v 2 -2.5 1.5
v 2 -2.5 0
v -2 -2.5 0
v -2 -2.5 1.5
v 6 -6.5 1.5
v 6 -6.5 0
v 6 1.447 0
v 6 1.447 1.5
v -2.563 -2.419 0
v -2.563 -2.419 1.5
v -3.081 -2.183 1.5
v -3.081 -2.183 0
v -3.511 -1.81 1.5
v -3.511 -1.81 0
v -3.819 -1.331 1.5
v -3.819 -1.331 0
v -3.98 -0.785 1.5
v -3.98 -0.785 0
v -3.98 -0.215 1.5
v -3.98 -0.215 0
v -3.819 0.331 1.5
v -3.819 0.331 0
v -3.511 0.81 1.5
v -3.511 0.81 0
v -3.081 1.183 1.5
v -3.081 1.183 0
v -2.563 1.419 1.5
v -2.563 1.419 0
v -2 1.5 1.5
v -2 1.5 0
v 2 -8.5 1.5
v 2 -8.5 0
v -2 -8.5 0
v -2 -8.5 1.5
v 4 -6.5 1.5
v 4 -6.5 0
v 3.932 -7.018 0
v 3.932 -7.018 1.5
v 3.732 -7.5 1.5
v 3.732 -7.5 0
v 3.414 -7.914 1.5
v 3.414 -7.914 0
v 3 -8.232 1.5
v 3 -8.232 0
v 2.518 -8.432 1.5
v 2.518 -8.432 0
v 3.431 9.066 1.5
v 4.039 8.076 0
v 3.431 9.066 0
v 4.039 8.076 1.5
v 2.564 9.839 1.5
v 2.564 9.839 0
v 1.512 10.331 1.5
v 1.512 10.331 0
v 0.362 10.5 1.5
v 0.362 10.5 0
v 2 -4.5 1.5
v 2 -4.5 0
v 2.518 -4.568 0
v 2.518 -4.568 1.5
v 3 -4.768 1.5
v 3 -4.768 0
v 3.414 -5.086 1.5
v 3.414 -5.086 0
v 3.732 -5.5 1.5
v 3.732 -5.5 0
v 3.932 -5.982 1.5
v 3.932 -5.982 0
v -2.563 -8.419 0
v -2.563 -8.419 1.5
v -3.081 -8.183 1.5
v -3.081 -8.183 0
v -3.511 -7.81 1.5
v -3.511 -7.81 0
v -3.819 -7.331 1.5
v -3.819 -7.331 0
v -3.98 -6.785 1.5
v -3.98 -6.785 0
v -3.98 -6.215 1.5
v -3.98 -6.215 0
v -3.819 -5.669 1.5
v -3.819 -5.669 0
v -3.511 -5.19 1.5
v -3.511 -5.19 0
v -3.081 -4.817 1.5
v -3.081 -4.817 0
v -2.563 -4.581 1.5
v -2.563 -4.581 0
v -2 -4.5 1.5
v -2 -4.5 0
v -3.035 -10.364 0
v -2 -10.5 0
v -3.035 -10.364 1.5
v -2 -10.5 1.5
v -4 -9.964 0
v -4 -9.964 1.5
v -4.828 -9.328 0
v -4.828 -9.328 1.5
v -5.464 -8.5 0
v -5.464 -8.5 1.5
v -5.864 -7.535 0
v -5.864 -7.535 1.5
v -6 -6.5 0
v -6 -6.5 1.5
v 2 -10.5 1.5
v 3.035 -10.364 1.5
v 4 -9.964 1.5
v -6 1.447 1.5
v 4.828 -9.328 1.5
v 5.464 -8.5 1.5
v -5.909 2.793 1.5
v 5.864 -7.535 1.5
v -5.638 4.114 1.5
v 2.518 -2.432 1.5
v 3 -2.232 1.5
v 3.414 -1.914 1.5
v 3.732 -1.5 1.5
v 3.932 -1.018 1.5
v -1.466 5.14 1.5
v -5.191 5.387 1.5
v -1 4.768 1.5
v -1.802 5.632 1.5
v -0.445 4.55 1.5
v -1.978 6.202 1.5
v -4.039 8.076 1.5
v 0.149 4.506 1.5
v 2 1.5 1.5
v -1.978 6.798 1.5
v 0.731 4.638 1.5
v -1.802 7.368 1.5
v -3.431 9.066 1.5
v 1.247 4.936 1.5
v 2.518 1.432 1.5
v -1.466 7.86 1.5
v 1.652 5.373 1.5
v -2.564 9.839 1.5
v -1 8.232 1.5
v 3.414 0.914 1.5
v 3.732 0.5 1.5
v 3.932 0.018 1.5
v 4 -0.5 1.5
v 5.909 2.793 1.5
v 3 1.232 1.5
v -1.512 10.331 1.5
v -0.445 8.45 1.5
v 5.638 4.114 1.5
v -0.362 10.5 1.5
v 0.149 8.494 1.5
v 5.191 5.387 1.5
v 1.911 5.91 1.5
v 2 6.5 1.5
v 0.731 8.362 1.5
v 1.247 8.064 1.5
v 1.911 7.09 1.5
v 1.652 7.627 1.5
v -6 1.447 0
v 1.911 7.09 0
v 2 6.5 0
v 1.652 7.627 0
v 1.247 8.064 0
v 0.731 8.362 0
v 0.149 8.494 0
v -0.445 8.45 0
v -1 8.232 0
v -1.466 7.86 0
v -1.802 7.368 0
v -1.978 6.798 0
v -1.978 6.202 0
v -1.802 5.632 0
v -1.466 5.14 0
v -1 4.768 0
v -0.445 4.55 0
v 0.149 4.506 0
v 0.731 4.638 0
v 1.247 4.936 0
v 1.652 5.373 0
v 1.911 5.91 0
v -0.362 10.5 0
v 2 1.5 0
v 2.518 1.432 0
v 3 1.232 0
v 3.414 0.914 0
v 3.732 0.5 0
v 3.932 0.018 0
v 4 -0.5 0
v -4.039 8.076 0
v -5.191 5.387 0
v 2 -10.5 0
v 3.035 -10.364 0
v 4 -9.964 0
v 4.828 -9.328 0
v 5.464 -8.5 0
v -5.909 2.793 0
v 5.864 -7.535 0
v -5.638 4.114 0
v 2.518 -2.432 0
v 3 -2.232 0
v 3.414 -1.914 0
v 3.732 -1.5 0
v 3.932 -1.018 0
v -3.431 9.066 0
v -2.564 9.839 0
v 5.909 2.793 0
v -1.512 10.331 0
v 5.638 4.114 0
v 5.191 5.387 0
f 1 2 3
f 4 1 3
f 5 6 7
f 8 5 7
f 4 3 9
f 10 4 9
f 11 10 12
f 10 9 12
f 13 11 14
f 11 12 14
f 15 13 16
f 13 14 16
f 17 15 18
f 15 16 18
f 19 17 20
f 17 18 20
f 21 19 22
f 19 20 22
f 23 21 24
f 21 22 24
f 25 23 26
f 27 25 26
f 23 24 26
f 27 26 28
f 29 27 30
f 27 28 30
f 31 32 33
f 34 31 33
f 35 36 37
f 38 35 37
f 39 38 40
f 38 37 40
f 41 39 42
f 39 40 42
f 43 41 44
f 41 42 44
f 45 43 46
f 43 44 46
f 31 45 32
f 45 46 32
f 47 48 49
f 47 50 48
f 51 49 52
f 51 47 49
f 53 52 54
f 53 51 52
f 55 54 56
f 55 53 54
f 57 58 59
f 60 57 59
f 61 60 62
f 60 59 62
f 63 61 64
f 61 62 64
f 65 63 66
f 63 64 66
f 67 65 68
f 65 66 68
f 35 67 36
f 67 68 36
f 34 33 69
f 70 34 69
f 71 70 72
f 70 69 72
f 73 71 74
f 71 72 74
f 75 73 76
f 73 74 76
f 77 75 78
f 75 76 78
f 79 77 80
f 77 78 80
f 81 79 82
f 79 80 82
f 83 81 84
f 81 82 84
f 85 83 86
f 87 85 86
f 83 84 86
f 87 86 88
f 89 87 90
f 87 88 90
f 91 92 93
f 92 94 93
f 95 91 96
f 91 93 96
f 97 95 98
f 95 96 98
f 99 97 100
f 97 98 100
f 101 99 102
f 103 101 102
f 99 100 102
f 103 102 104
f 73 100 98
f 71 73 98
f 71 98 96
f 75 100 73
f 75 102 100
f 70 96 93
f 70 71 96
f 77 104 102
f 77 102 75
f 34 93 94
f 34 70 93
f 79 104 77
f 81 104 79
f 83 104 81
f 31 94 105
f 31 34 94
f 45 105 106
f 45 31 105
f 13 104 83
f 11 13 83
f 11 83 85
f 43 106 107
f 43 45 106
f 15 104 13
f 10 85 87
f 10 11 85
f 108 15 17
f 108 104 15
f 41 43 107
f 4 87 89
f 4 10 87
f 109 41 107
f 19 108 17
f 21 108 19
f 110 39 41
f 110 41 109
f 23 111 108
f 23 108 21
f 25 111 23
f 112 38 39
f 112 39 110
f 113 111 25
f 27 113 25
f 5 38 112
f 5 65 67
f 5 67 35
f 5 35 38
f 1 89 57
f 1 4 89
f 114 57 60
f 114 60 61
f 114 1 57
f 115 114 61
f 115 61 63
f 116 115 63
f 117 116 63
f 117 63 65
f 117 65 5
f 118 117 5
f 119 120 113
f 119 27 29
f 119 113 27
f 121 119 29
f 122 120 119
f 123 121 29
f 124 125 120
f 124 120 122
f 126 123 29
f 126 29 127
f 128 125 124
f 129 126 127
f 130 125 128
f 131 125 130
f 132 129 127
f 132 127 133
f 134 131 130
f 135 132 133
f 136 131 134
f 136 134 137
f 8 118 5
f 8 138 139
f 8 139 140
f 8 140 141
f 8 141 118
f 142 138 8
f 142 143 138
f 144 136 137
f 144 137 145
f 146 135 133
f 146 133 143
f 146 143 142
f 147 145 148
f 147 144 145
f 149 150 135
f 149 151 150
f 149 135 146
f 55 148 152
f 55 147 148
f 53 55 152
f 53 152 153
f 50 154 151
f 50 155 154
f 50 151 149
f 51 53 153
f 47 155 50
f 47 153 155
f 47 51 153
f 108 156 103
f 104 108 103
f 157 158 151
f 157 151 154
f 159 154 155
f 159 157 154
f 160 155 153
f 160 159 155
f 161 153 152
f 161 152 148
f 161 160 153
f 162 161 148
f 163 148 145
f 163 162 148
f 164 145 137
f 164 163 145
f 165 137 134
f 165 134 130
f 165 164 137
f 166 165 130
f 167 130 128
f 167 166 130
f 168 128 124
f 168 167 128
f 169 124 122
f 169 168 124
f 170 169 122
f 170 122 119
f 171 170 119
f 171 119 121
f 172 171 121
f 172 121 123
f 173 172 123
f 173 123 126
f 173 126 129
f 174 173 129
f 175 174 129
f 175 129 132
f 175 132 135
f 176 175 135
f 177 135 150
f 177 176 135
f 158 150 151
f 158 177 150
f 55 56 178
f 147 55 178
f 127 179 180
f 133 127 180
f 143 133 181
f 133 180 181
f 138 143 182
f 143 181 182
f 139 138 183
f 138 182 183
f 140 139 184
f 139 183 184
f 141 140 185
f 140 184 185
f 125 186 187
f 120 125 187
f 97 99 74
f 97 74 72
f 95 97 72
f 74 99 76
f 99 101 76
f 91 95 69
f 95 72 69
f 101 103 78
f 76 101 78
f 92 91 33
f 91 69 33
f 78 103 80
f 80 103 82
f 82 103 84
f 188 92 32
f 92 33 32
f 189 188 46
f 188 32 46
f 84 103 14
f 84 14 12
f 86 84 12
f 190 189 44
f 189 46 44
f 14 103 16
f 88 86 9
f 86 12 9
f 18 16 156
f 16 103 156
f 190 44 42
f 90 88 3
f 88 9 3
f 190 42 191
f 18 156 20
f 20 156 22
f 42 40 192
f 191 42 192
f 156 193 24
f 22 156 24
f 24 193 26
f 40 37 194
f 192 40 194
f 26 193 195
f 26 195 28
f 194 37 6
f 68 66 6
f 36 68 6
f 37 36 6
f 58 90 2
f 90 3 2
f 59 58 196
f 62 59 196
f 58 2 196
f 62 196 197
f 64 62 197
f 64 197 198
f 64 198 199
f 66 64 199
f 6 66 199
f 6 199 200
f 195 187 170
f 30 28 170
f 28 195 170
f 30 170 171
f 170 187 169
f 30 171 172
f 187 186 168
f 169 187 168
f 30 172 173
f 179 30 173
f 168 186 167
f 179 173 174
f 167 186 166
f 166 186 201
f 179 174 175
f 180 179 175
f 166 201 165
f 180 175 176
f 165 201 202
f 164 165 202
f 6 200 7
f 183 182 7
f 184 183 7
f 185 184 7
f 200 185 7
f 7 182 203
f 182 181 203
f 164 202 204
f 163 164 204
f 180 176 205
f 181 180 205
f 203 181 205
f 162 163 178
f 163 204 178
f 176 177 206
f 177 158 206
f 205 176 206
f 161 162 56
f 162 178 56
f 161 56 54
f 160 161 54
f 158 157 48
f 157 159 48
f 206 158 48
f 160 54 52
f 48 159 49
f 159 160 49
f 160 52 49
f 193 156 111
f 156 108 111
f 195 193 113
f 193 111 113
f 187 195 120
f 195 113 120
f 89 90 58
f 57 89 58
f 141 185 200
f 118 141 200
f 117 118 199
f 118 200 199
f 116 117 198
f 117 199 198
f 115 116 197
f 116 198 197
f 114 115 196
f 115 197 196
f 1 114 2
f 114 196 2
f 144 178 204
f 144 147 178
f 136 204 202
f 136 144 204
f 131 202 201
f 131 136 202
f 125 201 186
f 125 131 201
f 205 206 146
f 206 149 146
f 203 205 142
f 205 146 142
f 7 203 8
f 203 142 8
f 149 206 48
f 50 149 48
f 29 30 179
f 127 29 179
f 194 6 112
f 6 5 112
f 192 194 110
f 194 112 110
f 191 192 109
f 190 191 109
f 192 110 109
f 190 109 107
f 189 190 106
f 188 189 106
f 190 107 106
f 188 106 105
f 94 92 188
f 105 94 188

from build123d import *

# Parameters (mm, degrees)
F0_R     = 2
F1_DEPTH = 1.5
F2_R     = 4
F3_R     = 10
F4_R     = 4


with BuildPart() as f1:
    # F0 (on Top) → F1 (new body)
    with BuildSketch(Plane.XY):
        Polygon((6, 3.5), (3, 10.5), (-3, 10.5), (-6, 3.5), (-6, -10.5), (6, -10.5), align=None)
        with BuildLine():
            ThreePointArc((-2, -8.5), (-4, -6.5), (-2, -4.5))
            Line((-2, -4.5), (2, -4.5))
            ThreePointArc((2, -4.5), (3.414214, -5.085786), (4, -6.5))
            ThreePointArc((4, -6.5), (3.414214, -7.914214), (2, -8.5))
            Line((2, -8.5), (-2, -8.5))
        make_face(mode=Mode.SUBTRACT)
        with BuildLine():
            ThreePointArc((-2, -2.5), (-4, -0.5), (-2, 1.5))
            Line((-2, 1.5), (2, 1.5))
            ThreePointArc((2, 1.5), (3.414214, 0.914214), (4, -0.5))
            ThreePointArc((4, -0.5), (3.414214, -1.914214), (2, -2.5))
            Line((2, -2.5), (-2, -2.5))
        make_face(mode=Mode.SUBTRACT)
        with Locations((0, 6.5)):
            Circle(F0_R, mode=Mode.SUBTRACT)
    extrude(amount=F1_DEPTH)

    # F2
    f2_edges = [f1.edges().sort_by_distance(p)[0] for p in [
        (3, 10.5, 0.75),
        (-3, 10.5, 0.75),
    ]]
    fillet(f2_edges, radius=F2_R)

    # F3
    f3_edges = [f1.edges().sort_by_distance(p)[0] for p in [
        (-6, 3.5, 0.75),
        (6, 3.5, 0.75),
    ]]
    fillet(f3_edges, radius=F3_R)

    # F4
    f4_edges = [f1.edges().sort_by_distance(p)[0] for p in [
        (-6, -10.5, 0.75),
        (6, -10.5, 0.75),
    ]]
    fillet(f4_edges, radius=F4_R)


solid = f1.part
